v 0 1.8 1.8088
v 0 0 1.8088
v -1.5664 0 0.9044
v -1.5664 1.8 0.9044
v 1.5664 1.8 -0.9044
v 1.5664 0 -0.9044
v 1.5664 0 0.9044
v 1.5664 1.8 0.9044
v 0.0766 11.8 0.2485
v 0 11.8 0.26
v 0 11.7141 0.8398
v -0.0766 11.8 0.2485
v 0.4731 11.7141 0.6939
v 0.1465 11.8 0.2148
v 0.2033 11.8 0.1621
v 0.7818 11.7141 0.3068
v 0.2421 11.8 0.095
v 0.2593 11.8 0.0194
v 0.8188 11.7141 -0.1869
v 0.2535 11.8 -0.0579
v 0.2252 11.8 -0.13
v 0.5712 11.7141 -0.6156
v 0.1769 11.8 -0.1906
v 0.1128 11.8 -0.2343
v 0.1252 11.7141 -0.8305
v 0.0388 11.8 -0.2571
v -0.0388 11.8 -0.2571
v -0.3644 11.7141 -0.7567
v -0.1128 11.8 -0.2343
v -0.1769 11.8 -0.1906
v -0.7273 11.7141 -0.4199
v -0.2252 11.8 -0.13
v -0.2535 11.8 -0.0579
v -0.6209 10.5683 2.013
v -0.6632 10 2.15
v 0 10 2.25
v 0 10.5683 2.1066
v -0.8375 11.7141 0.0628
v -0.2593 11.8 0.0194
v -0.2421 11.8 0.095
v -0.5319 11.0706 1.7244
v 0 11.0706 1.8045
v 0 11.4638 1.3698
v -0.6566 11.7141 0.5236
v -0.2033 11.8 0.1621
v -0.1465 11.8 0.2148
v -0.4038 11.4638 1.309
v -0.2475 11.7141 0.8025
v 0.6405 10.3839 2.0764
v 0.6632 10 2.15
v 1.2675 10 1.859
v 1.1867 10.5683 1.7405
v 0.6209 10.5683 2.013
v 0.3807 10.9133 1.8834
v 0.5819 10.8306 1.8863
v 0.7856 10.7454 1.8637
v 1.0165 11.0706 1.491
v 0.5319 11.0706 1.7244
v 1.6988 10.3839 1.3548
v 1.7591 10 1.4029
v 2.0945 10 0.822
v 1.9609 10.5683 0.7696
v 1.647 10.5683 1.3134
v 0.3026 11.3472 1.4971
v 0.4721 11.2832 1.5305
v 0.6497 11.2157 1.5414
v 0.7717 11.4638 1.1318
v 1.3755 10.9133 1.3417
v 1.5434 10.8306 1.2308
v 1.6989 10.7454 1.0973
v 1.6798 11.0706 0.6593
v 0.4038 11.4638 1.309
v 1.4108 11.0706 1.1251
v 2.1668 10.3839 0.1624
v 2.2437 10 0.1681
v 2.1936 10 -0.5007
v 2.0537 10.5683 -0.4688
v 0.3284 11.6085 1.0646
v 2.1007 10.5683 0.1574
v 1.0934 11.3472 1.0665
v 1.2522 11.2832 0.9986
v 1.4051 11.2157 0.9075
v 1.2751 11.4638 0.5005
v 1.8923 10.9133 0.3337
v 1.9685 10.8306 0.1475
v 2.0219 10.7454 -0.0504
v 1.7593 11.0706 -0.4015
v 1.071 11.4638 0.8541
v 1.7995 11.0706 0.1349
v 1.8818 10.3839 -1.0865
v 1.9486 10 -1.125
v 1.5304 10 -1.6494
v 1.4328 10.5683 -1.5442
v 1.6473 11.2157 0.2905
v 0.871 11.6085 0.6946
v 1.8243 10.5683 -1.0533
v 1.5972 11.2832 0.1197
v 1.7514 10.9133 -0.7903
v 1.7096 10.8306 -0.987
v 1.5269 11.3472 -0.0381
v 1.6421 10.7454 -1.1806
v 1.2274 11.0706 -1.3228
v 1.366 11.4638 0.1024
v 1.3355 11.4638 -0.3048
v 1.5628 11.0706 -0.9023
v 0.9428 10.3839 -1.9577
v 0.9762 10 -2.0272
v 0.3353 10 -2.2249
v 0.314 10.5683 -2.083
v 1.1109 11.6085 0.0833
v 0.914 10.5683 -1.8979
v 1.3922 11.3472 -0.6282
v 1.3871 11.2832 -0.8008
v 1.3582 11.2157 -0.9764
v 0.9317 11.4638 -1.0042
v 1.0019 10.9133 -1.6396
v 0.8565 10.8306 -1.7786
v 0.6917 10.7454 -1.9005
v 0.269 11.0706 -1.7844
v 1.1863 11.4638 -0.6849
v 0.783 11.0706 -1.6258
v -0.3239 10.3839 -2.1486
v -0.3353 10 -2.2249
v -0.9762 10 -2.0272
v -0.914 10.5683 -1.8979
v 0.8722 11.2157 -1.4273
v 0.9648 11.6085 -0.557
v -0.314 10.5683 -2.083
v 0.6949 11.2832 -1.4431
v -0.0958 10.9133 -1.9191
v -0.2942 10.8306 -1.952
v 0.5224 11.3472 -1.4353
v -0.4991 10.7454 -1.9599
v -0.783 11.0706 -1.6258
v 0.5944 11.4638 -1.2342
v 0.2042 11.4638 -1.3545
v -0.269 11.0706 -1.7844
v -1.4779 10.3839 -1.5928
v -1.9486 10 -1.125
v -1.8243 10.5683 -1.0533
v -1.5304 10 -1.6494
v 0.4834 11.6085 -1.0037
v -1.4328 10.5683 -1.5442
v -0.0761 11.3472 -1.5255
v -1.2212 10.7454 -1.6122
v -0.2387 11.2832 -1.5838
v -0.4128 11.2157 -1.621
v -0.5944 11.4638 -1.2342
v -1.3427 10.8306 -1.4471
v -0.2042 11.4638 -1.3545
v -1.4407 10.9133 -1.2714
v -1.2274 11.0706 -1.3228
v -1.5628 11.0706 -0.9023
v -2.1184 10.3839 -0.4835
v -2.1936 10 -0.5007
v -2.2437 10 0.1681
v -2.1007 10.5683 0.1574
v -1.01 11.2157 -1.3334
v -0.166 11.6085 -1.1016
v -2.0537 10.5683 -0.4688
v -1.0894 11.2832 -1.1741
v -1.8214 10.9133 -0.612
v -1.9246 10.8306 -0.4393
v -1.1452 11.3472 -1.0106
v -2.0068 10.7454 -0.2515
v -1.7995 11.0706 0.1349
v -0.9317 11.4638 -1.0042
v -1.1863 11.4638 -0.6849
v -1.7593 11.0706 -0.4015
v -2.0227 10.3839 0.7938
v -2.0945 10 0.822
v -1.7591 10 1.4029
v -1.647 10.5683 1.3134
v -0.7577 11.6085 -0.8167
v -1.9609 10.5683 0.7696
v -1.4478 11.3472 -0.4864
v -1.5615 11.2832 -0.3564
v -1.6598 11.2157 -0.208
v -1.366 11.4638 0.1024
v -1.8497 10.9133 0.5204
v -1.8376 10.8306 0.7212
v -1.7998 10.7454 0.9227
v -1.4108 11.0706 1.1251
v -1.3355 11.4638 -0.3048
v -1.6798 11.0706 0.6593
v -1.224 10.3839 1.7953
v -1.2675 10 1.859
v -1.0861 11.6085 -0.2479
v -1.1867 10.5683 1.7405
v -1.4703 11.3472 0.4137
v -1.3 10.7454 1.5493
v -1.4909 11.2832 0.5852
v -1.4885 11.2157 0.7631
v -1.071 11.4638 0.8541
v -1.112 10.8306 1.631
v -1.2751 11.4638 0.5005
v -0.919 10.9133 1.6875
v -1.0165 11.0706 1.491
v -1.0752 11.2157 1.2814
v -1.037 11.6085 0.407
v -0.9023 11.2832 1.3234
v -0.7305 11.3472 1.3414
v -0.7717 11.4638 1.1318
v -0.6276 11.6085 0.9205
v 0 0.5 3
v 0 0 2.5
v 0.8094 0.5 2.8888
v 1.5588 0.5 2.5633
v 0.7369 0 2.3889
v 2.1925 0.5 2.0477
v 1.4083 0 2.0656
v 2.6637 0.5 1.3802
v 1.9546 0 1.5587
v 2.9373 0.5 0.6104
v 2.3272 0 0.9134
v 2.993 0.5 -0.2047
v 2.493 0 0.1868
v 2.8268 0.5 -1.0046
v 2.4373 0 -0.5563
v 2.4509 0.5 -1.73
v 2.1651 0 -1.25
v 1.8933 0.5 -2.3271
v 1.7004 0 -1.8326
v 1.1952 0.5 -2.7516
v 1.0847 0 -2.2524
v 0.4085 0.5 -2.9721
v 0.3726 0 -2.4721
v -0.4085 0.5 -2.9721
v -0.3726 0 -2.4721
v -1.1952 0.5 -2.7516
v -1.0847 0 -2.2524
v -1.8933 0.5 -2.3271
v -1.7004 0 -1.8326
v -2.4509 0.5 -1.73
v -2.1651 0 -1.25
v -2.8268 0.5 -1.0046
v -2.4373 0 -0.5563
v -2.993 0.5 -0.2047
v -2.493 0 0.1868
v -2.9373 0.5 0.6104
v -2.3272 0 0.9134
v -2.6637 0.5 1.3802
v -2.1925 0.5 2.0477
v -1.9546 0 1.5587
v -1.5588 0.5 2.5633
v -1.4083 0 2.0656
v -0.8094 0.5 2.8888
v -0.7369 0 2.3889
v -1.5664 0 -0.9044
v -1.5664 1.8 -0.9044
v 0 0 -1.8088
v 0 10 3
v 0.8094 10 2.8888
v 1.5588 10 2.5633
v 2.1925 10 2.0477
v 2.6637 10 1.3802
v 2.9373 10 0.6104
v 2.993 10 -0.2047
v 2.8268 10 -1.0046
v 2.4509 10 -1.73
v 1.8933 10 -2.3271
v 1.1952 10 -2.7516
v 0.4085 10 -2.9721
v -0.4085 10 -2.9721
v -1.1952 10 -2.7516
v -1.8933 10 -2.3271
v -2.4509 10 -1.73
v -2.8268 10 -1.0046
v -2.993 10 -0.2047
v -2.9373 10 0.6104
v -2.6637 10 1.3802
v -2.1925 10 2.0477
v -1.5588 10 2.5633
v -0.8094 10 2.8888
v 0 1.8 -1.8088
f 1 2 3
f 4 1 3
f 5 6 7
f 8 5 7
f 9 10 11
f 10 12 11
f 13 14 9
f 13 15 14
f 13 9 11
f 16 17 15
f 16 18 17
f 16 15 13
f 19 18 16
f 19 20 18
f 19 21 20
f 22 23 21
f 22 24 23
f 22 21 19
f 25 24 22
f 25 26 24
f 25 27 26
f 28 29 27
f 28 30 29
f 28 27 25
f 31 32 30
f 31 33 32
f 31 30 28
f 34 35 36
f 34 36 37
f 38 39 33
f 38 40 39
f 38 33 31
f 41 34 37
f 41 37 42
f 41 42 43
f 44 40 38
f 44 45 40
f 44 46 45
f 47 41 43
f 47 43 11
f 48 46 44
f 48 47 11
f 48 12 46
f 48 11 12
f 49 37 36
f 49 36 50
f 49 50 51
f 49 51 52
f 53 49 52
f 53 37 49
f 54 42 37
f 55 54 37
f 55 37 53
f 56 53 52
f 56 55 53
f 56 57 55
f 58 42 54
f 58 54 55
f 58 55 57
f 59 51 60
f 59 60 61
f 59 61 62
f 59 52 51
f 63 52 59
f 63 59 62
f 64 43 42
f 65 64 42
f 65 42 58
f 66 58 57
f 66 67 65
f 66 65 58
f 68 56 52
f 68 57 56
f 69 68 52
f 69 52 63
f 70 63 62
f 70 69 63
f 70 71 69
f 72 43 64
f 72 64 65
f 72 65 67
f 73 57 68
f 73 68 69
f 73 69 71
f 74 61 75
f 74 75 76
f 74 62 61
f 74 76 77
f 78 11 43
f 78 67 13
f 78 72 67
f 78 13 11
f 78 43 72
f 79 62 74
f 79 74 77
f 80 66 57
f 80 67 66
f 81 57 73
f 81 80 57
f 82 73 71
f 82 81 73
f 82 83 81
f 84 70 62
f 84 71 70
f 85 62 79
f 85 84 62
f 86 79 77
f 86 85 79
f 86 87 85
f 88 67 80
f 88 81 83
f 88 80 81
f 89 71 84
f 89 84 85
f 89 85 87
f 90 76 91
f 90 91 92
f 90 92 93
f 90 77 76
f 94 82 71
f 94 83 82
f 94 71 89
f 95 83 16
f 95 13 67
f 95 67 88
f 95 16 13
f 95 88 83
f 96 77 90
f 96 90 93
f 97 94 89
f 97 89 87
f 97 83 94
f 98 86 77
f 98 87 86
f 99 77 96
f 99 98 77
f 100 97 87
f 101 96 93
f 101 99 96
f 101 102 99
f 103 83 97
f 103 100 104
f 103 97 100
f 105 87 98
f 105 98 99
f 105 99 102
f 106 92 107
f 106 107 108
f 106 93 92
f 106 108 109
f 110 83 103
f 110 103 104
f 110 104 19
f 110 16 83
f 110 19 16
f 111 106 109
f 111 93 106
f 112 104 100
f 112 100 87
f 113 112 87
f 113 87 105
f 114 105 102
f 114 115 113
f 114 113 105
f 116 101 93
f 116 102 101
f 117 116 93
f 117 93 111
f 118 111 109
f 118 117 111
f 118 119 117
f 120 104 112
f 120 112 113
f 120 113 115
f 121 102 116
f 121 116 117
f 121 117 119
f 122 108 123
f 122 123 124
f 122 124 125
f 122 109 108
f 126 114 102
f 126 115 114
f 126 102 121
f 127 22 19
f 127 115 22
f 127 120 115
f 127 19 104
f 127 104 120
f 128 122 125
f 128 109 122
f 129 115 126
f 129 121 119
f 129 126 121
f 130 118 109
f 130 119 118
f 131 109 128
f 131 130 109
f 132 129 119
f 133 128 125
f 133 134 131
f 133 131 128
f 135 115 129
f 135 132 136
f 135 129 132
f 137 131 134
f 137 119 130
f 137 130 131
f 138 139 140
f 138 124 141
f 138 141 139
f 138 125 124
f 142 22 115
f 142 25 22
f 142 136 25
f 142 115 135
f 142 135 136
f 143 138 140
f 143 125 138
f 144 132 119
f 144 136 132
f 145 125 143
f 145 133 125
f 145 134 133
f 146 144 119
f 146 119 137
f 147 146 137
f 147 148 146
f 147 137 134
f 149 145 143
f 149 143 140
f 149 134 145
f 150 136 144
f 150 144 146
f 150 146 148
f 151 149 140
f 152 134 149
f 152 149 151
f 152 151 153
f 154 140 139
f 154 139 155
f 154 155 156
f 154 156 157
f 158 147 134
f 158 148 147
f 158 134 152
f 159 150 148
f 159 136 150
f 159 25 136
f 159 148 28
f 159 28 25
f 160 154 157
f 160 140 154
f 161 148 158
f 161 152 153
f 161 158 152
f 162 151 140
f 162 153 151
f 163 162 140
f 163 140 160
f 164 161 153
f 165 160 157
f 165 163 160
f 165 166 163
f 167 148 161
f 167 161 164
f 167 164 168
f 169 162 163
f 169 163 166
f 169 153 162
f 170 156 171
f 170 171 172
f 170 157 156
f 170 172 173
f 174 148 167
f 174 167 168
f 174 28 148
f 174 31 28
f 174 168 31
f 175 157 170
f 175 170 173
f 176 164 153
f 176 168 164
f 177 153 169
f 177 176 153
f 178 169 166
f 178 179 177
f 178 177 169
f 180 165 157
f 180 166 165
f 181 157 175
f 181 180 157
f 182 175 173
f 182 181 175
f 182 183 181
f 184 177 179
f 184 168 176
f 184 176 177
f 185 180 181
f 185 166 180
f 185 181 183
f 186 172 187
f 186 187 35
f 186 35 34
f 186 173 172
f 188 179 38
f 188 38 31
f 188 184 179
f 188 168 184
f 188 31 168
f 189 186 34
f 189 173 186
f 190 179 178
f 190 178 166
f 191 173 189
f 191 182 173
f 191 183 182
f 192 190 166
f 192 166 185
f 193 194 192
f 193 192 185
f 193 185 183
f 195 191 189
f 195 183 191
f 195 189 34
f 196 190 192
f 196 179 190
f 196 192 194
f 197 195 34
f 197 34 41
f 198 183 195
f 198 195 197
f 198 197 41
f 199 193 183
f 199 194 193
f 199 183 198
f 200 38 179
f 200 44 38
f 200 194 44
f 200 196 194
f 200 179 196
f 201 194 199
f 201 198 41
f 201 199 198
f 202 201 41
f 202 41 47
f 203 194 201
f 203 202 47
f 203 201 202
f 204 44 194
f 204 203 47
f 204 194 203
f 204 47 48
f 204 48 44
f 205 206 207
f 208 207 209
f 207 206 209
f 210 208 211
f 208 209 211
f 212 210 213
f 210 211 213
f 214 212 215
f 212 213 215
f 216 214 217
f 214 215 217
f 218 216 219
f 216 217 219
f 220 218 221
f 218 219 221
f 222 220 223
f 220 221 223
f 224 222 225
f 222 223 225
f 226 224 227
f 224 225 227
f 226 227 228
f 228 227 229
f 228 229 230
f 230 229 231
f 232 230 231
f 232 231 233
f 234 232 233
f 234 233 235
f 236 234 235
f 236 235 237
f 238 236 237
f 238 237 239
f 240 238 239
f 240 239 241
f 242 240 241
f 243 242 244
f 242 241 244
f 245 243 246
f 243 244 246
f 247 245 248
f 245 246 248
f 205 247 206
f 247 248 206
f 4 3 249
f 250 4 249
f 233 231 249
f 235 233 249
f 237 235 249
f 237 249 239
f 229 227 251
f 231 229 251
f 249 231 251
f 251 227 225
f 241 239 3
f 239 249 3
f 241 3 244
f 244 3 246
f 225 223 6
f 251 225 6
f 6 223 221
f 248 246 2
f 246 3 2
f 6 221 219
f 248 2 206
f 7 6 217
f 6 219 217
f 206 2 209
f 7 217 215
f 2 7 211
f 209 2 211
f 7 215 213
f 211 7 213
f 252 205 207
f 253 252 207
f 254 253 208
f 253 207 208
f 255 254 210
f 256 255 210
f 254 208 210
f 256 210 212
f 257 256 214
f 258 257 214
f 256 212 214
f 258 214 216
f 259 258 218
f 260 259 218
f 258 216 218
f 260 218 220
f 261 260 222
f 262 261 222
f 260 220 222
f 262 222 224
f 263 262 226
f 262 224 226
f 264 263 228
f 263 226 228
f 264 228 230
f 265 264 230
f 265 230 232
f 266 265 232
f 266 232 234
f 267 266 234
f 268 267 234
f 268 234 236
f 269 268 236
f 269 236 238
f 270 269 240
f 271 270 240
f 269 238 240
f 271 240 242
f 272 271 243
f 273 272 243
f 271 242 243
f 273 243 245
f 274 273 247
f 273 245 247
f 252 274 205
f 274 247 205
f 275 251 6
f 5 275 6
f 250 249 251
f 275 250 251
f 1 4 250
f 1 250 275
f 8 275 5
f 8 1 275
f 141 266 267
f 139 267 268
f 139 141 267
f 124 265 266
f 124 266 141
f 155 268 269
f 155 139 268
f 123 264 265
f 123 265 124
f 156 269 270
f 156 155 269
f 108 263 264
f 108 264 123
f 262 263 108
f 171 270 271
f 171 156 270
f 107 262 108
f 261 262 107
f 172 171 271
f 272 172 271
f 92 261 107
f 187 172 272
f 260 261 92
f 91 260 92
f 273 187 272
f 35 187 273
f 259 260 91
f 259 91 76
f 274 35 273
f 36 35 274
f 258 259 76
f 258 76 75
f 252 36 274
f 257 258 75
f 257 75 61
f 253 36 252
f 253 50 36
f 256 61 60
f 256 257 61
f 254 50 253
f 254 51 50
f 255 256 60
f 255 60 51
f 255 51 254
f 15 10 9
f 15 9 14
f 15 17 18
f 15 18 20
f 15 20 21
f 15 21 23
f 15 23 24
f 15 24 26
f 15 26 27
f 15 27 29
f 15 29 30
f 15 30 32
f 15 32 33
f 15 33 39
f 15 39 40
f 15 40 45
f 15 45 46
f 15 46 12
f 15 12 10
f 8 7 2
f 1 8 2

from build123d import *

# Parameters (mm, degrees)
SKETCH_1_R          = 3
EXTRUDE_1_DEPTH     = 10
SKETCH_2_R          = 2.25
EXTRUDE_2_DEPTH     = 1.8
FILLET_2_R          = 2
CHAMFER_1_SIZE      = 0.5
CUT_EXTRUDE_1_DEPTH = 1.8


with BuildPart() as part:
    # 草图1 → 凸台-拉伸1 (new body)
    with BuildSketch(Plane(origin=(0, 0, 0), x_dir=(1, 0, 0), z_dir=(0, 1, 0))):
        with Locations(Location((0, 0, 0), (0, 0, 270))):
            Circle(SKETCH_1_R)
    extrude(amount=EXTRUDE_1_DEPTH)

    # 草图2 → 凸台-拉伸2 (add)
    with BuildSketch(Plane(origin=(0, 10, 0), x_dir=(1, 0, 0), z_dir=(0, 1, 0))):
        with Locations(Location((0, 0, 0), (0, 0, 270))):
            Circle(SKETCH_2_R)
    extrude(amount=EXTRUDE_2_DEPTH)

    # 圆角2
    # the kernel refuses this fillet: 2 mm, written as the material it takes off along each edge
    with BuildSketch(Plane(origin=(0, 11.8, 0), x_dir=(0, 0, 1), z_dir=(-1, 0, 0))) as fillet_2_piece_1:
        with BuildLine():
            CenterArc((0.260025126, -2), FILLET_2_R, 5.739170477, 84.260829523)
            Line((0.260025126, 0), (0.260025126, 0.04))
            Line((0.260025126, 0.04), (2.25, 0.04))
            Line((2.25, 0.04), (2.29, 0))
            ThreePointArc((2.29, 0), (2.29, -0.9), (2.289799497, -1.796))
            Line((2.289799497, -1.796), (2.25, -1.8))
        make_face()
    revolve(axis=Axis((0, 11.8, 0), (0, 1, 0)), mode=Mode.SUBTRACT)

    # 倒角1
    chamfer_1_edges = [part.edges().sort_by_distance(p)[0] for p in [
        (0, 0, -3),
    ]]
    chamfer(chamfer_1_edges, length=CHAMFER_1_SIZE)

    # 草图3 → 切除-拉伸1 (cut)
    with BuildSketch(Plane.XZ):
        Polygon((0, 1.808769012), (-1.566439914, 0.904384506), (-1.566439914, -0.904384506), (0, -1.808769012), (1.566439914, -0.904384506), (1.566439914, 0.904384506), align=None)
    extrude(amount=-CUT_EXTRUDE_1_DEPTH, mode=Mode.SUBTRACT)


solid = part.part
